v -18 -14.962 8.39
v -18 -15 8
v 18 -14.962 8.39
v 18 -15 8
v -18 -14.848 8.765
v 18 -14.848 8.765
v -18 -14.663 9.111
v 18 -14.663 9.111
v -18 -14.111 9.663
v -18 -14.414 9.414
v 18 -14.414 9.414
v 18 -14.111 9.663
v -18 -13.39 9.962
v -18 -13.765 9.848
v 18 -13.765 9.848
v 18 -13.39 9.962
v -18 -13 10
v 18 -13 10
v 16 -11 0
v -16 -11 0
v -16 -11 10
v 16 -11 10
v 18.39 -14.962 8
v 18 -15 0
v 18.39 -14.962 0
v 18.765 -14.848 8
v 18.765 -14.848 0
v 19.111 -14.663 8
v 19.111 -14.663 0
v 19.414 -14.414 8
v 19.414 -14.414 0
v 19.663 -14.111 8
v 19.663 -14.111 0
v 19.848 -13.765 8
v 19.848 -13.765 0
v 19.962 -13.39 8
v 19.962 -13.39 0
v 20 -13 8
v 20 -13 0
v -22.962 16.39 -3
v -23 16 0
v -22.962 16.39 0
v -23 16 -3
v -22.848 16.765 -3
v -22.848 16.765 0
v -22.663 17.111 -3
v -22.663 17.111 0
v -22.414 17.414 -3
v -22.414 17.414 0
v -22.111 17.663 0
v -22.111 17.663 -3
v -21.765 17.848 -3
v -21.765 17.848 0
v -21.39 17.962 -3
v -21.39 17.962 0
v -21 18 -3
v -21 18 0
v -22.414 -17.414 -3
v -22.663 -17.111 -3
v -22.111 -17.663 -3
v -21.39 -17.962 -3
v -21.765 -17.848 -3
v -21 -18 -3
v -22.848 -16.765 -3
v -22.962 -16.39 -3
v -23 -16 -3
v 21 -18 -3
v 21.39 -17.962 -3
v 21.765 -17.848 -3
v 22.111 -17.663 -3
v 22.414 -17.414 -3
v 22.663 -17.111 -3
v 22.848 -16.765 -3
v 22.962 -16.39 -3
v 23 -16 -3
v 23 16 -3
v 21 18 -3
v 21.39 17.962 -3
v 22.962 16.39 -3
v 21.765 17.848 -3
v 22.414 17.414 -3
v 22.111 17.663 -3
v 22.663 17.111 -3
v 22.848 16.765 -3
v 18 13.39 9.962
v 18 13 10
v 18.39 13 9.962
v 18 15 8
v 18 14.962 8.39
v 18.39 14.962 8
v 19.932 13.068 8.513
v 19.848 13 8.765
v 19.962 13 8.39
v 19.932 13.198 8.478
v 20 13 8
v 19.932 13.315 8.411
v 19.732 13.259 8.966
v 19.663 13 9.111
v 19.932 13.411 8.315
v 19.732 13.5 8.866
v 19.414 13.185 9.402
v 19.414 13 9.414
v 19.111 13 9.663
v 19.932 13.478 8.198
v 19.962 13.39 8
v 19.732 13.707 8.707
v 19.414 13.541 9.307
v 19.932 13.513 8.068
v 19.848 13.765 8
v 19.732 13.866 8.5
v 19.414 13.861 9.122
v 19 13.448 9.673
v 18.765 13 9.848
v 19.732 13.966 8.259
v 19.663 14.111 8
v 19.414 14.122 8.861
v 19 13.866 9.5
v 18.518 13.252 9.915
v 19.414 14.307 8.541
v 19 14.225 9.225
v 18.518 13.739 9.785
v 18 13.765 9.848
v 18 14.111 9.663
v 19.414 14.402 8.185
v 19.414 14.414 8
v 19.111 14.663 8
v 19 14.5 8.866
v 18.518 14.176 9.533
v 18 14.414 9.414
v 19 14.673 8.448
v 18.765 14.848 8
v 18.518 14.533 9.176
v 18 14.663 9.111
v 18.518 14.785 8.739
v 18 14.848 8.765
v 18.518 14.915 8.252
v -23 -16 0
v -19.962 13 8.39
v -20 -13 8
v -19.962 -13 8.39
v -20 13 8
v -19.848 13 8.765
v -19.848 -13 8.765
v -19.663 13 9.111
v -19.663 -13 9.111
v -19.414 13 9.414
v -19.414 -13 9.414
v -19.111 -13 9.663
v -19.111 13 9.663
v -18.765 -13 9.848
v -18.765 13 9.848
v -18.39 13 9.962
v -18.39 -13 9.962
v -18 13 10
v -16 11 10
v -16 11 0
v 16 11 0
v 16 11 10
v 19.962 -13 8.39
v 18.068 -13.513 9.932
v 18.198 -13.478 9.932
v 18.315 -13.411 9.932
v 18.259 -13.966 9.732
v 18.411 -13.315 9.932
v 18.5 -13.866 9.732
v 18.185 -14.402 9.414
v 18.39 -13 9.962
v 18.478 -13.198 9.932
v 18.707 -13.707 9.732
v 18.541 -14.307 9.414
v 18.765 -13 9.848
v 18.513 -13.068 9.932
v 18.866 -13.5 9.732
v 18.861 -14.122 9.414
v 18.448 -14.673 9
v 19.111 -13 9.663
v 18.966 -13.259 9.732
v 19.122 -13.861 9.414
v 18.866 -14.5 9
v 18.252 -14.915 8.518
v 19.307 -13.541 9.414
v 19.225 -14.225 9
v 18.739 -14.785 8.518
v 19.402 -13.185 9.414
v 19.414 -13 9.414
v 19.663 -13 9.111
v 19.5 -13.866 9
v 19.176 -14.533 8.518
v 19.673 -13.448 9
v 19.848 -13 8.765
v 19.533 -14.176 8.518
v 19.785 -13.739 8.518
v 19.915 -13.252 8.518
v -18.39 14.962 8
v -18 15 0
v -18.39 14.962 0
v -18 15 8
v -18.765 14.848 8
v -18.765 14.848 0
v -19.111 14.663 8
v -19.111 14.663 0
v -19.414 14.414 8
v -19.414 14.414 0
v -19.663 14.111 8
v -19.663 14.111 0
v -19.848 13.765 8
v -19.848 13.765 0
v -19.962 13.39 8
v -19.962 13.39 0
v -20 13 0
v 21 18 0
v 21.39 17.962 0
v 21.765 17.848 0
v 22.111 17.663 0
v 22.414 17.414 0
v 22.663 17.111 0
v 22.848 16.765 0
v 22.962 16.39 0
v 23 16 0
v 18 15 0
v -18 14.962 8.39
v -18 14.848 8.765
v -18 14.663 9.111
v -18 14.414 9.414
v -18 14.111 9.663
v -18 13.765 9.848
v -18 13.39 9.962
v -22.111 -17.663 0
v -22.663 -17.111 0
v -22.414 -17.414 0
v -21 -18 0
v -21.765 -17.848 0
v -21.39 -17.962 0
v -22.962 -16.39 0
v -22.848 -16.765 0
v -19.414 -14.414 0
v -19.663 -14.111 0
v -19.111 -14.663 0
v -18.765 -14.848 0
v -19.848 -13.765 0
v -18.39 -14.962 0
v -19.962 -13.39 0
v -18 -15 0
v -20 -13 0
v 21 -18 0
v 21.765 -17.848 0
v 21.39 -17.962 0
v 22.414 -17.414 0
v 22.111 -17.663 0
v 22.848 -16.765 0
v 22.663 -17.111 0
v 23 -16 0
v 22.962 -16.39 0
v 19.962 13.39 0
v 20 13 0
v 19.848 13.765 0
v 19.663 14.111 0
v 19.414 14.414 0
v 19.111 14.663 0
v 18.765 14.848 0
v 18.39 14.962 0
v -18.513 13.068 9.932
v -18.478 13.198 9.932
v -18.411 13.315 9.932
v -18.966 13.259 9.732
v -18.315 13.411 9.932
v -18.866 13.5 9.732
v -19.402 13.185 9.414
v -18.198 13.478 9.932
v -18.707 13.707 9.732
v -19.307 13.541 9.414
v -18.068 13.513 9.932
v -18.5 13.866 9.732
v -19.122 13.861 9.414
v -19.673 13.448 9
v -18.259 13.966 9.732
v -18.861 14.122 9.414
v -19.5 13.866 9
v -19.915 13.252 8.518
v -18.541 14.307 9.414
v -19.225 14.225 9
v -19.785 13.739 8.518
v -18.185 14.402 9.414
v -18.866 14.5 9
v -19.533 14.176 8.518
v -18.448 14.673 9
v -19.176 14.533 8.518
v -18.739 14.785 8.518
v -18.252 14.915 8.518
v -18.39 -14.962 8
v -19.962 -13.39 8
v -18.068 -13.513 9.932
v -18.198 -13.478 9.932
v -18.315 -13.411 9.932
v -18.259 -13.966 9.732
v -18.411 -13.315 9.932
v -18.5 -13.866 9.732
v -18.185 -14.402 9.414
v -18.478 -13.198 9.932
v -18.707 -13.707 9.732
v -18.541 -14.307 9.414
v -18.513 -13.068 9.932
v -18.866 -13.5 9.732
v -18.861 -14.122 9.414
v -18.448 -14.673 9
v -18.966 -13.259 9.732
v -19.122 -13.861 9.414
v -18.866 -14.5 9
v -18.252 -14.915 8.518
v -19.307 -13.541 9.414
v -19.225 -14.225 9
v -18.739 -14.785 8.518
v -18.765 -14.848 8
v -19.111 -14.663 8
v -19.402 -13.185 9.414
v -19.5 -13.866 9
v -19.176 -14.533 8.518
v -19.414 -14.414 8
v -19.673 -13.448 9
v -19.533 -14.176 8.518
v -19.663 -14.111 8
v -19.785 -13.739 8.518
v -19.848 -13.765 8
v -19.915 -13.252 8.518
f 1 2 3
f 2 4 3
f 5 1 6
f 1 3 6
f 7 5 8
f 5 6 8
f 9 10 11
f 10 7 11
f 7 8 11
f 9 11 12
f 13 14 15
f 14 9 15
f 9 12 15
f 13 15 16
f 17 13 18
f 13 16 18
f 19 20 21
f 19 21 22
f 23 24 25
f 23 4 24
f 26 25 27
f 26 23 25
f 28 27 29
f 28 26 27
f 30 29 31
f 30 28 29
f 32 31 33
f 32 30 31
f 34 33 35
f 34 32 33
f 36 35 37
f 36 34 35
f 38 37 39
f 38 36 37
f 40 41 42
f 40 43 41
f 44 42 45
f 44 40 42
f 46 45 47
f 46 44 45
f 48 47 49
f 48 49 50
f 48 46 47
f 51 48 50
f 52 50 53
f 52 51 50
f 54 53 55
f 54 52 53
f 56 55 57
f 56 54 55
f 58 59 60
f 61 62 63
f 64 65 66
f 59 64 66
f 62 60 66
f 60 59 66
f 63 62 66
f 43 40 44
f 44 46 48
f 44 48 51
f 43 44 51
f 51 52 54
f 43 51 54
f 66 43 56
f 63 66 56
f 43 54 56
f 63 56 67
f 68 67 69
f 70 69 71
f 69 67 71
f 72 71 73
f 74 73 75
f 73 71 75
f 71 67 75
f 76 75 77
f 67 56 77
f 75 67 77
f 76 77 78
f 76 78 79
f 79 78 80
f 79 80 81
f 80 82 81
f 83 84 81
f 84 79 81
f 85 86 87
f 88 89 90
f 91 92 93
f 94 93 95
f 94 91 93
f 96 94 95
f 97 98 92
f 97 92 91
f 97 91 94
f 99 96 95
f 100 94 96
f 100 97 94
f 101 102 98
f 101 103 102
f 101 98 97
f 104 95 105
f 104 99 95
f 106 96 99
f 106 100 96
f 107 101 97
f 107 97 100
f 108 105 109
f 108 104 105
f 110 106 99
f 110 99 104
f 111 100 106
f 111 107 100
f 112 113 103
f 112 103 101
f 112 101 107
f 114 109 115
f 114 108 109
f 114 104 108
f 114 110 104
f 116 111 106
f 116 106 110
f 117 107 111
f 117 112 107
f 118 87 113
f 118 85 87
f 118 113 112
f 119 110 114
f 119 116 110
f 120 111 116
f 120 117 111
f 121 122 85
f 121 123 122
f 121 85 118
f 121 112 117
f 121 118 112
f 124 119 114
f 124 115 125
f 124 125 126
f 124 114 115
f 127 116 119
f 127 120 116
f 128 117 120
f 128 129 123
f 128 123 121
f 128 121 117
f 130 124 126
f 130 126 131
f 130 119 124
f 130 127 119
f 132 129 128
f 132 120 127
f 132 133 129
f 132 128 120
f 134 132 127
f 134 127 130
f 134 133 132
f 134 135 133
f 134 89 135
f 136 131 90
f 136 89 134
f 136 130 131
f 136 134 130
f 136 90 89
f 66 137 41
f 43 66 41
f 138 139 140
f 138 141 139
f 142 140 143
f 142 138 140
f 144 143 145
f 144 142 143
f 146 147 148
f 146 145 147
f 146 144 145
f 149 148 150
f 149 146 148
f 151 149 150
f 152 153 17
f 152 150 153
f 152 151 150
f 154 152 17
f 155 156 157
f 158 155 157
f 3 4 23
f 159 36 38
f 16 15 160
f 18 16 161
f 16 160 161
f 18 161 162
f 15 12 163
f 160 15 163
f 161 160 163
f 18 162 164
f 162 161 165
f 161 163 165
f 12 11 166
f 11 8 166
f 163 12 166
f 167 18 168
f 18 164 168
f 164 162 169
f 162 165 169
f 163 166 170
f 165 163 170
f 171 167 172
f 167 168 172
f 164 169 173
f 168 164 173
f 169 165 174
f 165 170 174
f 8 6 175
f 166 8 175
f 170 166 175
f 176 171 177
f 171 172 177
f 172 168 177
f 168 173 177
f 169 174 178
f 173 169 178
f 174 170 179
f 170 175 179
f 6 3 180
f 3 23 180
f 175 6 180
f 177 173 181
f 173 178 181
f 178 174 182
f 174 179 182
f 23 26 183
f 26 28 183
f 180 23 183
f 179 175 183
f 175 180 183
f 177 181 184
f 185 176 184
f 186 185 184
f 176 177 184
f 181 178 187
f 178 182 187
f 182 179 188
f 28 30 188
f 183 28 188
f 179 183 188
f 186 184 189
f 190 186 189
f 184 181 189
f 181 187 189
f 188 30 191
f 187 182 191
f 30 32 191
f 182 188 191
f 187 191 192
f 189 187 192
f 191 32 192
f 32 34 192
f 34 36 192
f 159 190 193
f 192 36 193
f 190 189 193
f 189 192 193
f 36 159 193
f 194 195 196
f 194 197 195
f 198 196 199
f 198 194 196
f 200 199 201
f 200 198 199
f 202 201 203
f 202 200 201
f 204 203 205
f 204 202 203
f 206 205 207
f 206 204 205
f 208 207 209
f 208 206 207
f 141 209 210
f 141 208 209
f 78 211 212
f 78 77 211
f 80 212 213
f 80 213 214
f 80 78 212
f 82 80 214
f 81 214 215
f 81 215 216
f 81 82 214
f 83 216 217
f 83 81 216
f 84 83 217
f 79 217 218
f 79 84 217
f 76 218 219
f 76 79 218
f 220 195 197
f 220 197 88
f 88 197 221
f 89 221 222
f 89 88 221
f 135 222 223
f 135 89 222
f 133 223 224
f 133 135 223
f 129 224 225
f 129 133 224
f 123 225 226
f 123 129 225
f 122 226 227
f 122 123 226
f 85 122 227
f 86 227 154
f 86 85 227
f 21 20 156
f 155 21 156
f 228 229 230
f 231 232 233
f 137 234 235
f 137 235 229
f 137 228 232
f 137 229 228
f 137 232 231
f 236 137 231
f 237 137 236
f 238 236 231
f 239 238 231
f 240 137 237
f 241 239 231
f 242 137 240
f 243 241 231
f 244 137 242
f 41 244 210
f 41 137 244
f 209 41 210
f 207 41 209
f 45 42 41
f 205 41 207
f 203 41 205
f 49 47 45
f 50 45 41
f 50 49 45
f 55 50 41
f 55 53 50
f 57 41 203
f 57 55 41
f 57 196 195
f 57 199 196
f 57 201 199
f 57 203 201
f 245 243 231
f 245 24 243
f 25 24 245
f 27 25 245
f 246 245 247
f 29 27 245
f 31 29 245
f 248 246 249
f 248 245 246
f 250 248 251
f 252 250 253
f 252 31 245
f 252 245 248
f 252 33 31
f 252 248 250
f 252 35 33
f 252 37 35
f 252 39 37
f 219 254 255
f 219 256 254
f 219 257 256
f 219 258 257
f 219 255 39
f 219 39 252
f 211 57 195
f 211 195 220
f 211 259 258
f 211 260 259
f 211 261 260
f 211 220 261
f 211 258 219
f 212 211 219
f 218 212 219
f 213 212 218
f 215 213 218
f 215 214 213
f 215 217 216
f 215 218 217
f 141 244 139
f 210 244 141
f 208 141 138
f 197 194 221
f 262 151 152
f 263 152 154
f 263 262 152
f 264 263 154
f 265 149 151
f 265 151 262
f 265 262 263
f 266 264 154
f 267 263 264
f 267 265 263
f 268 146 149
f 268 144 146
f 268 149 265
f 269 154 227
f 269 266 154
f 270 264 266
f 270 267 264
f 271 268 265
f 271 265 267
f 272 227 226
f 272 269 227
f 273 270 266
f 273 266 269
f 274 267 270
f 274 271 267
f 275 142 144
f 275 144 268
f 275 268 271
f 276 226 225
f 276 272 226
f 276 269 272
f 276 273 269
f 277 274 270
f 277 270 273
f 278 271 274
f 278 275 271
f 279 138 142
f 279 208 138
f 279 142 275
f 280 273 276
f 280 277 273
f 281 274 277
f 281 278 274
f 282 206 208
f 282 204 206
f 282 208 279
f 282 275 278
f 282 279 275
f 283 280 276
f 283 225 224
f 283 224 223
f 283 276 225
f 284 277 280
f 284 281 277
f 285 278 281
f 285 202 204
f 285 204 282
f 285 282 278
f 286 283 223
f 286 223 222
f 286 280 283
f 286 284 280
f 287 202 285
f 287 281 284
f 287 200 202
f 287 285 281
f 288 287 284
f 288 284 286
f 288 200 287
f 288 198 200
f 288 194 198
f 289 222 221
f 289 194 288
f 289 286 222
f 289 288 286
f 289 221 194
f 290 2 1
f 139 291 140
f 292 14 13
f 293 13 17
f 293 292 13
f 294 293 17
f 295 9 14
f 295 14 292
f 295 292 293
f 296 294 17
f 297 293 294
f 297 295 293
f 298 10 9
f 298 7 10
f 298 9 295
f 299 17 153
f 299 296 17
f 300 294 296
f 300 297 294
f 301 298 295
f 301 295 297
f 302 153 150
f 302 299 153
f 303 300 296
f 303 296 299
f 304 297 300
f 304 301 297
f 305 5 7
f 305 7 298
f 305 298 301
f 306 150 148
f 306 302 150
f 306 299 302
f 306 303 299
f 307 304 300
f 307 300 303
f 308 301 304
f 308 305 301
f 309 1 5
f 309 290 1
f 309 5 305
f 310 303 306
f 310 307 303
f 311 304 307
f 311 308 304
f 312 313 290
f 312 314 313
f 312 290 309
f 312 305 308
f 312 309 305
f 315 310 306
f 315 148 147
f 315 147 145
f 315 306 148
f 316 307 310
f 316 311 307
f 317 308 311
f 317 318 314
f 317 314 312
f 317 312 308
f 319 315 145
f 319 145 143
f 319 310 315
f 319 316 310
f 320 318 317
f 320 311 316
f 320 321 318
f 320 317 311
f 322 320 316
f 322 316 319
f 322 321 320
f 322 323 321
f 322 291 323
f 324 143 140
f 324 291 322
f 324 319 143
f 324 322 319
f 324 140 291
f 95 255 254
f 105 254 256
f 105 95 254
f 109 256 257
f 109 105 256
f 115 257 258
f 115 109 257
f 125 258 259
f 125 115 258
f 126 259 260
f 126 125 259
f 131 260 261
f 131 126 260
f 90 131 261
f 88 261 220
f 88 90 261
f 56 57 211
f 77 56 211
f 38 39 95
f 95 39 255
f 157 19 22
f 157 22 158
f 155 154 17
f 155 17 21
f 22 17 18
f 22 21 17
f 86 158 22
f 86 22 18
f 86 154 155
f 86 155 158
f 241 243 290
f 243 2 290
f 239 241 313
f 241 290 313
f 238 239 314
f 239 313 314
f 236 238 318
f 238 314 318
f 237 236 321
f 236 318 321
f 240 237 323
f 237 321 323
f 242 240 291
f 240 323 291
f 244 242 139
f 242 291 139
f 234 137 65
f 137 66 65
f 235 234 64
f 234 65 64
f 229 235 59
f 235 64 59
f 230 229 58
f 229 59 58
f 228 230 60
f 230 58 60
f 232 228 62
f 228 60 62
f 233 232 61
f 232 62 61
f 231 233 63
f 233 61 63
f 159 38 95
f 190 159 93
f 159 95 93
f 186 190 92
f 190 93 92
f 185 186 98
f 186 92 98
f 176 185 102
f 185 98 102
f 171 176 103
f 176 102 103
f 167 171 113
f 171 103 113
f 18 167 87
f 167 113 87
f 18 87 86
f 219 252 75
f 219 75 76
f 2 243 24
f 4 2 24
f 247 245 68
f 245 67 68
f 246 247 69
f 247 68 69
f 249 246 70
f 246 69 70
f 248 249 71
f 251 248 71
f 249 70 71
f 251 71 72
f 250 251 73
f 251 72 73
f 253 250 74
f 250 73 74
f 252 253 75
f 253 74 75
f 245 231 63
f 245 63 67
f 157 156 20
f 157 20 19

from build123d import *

# Parameters (mm, degrees)
F0_W     = 40
F0_H     = 30
F0_W_2   = 32
F0_H_2   = 22
F1_DEPTH = 10
F0_W_3   = 46
F0_H_3   = 36
F2_DEPTH = 3
F3_R     = 2


with BuildPart() as f1:
    # F0 (on Top) → F1 (new body)
    with BuildSketch(Plane.XY):
        Rectangle(F0_W, F0_H)
        Rectangle(F0_W_2, F0_H_2, mode=Mode.SUBTRACT)
    extrude(amount=F1_DEPTH)

    # F0 (on Top) → F2 (join)
    with BuildSketch(Plane.XY):
        Rectangle(F0_W_3, F0_H_3)
        Rectangle(F0_W, F0_H, mode=Mode.SUBTRACT)
        Rectangle(F0_W, F0_H)
        Rectangle(F0_W_2, F0_H_2, mode=Mode.SUBTRACT)
        Rectangle(F0_W_2, F0_H_2)
    extrude(amount=-F2_DEPTH)

    # F3
    f3_edges = [f1.edges().sort_by_distance(p)[0] for p in [
        (-20, -15, 5),
        (-20, 15, 5),
        (20, -15, 5),
        (0, -15, 10),
        (-20, 0, 10),
        (0, 15, 10),
        (20, 0, 10),
        (20, 15, 5),
        (23, 18, -1.5),
        (23, -18, -1.5),
        (-23, -18, -1.5),
        (-23, 18, -1.5),
    ]]
    fillet(f3_edges, radius=F3_R)


solid = f1.part
